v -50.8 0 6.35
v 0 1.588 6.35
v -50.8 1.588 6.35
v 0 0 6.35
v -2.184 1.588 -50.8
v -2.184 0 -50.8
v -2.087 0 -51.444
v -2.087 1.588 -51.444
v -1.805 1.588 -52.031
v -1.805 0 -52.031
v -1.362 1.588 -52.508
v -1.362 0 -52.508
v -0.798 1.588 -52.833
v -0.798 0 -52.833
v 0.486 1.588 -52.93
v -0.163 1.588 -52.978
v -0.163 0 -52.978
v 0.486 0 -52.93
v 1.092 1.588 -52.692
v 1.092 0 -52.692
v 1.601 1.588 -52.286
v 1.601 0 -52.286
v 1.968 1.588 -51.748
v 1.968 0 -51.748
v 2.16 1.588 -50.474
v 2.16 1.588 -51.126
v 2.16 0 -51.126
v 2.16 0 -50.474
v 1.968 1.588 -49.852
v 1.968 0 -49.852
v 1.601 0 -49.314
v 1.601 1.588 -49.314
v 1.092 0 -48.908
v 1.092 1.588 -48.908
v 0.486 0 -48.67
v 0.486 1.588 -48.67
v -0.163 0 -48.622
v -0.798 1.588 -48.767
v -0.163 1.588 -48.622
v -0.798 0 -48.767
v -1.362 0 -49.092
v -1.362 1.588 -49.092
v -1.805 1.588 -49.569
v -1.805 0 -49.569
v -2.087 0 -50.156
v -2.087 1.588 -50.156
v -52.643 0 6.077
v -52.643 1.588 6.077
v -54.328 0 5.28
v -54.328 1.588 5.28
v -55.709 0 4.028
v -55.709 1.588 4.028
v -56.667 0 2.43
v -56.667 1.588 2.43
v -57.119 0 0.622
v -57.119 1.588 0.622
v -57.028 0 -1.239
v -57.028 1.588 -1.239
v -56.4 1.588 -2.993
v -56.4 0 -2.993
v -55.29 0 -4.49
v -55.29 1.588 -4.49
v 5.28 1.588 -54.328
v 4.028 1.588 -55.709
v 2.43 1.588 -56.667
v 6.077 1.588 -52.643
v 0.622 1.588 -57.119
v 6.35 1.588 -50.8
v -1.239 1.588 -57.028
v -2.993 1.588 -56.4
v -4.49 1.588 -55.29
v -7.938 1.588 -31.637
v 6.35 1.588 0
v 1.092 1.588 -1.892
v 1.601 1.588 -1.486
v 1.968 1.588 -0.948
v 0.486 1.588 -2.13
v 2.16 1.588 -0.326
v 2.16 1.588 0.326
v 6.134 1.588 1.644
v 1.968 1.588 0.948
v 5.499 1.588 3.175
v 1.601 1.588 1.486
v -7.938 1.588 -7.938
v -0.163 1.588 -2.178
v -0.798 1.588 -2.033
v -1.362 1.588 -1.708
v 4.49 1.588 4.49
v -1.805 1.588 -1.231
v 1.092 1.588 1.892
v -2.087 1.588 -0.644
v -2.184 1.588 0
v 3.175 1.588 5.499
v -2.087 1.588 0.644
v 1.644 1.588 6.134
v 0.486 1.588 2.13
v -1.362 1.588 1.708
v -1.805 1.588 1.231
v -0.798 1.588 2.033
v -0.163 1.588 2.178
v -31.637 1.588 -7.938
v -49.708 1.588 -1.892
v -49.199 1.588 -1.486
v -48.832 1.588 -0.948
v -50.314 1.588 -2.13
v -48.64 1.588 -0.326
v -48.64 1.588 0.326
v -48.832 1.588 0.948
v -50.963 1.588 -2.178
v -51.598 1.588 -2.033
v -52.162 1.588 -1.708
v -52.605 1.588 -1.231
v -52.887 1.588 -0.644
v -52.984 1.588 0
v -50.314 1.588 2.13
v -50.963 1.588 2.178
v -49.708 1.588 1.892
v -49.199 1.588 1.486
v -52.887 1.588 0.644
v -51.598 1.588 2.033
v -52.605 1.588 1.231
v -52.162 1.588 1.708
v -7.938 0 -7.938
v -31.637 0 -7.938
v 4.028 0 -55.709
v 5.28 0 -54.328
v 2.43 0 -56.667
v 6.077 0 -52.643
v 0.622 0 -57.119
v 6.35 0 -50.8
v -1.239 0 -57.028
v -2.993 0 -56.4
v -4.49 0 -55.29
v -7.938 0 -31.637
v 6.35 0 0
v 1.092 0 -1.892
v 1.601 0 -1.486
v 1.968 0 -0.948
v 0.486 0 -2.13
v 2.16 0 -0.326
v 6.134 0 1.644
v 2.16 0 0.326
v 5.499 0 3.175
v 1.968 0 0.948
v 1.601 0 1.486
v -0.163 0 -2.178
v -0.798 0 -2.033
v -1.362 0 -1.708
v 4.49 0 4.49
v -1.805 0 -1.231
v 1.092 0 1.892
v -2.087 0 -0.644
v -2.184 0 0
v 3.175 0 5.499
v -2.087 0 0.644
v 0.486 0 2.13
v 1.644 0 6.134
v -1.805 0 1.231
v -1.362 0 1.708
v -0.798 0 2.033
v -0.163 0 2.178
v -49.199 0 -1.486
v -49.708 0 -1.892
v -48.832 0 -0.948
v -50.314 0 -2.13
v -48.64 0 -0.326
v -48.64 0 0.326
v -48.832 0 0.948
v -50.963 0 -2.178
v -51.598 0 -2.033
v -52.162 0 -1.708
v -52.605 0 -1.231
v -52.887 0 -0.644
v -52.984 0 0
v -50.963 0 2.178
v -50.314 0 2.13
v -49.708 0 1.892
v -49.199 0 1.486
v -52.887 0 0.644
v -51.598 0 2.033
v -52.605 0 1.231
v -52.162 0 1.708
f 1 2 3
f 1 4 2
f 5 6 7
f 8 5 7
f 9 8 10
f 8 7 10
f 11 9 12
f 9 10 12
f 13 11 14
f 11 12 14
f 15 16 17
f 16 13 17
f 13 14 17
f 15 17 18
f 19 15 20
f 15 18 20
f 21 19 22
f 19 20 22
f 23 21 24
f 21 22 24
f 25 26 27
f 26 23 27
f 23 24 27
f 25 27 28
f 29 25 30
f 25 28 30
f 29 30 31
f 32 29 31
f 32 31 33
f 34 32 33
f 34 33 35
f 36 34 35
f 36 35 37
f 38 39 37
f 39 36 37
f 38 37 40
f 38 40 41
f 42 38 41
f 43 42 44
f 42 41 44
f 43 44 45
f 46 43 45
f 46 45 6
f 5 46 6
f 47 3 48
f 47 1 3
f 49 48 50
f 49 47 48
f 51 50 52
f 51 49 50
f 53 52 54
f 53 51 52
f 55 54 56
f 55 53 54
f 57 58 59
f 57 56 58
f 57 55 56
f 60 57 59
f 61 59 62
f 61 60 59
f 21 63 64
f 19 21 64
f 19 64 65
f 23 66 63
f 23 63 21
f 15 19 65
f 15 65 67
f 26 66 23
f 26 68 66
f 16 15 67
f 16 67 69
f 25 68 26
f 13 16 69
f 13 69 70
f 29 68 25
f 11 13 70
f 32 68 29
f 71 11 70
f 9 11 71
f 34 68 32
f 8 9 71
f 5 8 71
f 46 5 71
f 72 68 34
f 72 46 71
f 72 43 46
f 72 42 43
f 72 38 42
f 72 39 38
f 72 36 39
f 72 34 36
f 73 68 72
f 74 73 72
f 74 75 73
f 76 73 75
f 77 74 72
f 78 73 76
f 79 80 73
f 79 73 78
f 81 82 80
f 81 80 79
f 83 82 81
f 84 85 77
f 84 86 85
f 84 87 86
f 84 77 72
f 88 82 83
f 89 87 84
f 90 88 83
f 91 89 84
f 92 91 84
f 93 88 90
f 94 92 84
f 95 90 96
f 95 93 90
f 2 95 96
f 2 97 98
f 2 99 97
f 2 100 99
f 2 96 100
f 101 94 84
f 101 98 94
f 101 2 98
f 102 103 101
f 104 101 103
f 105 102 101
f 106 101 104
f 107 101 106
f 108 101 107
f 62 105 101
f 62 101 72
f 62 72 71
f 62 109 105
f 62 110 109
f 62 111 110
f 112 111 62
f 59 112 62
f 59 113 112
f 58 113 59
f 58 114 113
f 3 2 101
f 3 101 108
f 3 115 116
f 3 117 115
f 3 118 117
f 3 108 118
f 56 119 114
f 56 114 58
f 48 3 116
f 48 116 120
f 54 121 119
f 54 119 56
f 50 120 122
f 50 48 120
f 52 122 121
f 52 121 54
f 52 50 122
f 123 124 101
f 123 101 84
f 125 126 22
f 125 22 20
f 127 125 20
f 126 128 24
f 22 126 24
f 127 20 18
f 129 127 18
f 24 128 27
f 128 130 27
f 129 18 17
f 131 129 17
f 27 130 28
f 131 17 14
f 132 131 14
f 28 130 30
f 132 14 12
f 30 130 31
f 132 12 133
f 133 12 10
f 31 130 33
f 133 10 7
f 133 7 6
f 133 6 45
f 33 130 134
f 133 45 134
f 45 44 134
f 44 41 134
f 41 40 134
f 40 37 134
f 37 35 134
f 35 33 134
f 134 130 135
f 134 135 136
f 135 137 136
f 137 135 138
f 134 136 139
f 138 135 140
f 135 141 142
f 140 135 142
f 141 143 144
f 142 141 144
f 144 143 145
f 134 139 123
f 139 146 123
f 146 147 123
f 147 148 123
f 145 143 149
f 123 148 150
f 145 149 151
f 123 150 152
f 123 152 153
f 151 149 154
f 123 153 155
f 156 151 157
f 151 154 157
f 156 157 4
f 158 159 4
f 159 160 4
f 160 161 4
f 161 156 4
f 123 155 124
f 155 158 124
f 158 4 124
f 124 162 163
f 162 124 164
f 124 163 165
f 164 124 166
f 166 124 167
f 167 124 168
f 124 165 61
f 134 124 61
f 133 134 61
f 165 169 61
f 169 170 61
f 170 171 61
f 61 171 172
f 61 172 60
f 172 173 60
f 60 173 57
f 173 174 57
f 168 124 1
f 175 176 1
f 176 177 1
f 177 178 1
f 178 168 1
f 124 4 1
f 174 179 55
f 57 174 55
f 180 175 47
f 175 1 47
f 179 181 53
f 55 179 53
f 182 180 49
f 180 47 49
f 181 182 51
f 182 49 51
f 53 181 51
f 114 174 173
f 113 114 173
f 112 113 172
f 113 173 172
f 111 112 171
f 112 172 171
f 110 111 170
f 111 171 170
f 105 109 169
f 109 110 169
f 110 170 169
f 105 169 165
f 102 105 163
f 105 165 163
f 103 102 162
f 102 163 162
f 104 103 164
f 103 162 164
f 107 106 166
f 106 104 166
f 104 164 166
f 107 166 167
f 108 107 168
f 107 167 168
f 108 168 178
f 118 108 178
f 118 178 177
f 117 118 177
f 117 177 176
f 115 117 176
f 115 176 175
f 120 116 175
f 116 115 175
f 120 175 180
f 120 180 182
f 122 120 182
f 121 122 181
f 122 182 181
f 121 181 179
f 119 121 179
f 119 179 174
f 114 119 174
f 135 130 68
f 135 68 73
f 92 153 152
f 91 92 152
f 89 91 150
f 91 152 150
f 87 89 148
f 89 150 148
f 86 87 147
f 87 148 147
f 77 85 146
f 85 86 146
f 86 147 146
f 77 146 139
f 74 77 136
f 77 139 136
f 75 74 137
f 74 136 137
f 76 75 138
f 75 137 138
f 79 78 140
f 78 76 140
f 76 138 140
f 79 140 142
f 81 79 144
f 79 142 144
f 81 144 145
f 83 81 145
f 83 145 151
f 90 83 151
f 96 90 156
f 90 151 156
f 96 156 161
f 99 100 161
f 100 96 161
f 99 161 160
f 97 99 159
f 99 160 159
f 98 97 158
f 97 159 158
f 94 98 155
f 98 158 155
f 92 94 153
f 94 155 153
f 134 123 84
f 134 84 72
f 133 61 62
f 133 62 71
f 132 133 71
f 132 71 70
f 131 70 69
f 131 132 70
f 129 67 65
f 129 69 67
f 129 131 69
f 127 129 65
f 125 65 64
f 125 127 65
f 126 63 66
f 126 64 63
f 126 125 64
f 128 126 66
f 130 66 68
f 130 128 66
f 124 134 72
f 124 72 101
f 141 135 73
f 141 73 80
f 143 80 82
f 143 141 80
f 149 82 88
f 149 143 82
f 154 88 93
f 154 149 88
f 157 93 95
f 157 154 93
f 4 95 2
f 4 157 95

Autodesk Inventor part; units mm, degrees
ref_plane "YZ Plane" through (0, 0, 0) normal (1, 0, 0) x (0, 1, 0)
ref_plane "XZ Plane" through (0, 0, 0) normal (0, 1, 0) x (-1, 0, 0)
ref_plane "XY Plane" through (0, 0, 0) normal (0, 0, 1) x (1, 0, 0)
sketch "main" plane through (0, 0, 0) normal (0, 0, 1) x (1, 0, 0)
  circle A0 centre (-24.2926, 27.4457) radius 2.1844
  circle A1 centre (-24.2926, -23.3543) radius 2.1844
  circle A2 centre (26.5074, 27.4457) radius 2.1844
  arc A3 (-30.6426, -23.3543) -> (-19.8025, -27.8444) centre (-24.2926, -23.3543) ccw
  arc A4 (30.9975, 22.9556) -> (26.5074, 33.7957) centre (26.5074, 27.4457) ccw
  arc A5 (-24.2926, 33.7957) -> (-30.6426, 27.4457) centre (-24.2926, 27.4457) ccw
  line L0 (-30.6426, -23.3543) -> (-30.6426, 27.4457)
  line L1 (-24.2926, 33.7957) -> (26.5074, 33.7957)
  line L2 (30.9975, 22.9556) -> (-19.8025, -27.8444)
  line L3 (-16.3551, -4.1915) -> (7.3446, 19.5082)
  line L4 (7.3446, 19.5082) -> (-16.3551, 19.5082)
  line L5 (-16.3551, 19.5082) -> (-16.3551, -4.1915)
  point P0 (-7.9432, 11.0963)
  dimension "d0" = 12.7
  dimension "d1" = 12.7
  dimension "d2" = 12.7
  dimension "d3" = 14.2875
sketch "Sketch1" plane through (0, 0, 0) normal (0, 1, 0) x (-1, 0, 0)
  circle A0 centre (0, 0) radius 2.1844
  circle A1 centre (0, -50.8) radius 2.1844
  circle A2 centre (50.8, 0) radius 2.1844
  arc A3 (-6.35, -50.8) -> (4.4901, -55.2901) centre (0, -50.8) ccw
  arc A4 (55.2901, -4.4901) -> (50.8, 6.35) centre (50.8, 0) ccw
  arc A5 (0, 6.35) -> (-6.35, 0) centre (0, 0) ccw
  line L0 (-6.35, -50.8) -> (-6.35, 0)
  line L1 (0, 6.35) -> (50.8, 6.35)
  line L2 (55.2901, -4.4901) -> (4.4901, -55.2901)
  line L3 (7.9375, -31.6372) -> (31.6372, -7.9375)
  line L4 (31.6372, -7.9375) -> (7.9375, -7.9375)
  line L5 (7.9375, -7.9375) -> (7.9375, -31.6372)
extrude "Extrusion1" add sketch "Sketch1" along normal blind 1.5875
properties part number "Triangle Gusset" material "Acetal Resin, White"
